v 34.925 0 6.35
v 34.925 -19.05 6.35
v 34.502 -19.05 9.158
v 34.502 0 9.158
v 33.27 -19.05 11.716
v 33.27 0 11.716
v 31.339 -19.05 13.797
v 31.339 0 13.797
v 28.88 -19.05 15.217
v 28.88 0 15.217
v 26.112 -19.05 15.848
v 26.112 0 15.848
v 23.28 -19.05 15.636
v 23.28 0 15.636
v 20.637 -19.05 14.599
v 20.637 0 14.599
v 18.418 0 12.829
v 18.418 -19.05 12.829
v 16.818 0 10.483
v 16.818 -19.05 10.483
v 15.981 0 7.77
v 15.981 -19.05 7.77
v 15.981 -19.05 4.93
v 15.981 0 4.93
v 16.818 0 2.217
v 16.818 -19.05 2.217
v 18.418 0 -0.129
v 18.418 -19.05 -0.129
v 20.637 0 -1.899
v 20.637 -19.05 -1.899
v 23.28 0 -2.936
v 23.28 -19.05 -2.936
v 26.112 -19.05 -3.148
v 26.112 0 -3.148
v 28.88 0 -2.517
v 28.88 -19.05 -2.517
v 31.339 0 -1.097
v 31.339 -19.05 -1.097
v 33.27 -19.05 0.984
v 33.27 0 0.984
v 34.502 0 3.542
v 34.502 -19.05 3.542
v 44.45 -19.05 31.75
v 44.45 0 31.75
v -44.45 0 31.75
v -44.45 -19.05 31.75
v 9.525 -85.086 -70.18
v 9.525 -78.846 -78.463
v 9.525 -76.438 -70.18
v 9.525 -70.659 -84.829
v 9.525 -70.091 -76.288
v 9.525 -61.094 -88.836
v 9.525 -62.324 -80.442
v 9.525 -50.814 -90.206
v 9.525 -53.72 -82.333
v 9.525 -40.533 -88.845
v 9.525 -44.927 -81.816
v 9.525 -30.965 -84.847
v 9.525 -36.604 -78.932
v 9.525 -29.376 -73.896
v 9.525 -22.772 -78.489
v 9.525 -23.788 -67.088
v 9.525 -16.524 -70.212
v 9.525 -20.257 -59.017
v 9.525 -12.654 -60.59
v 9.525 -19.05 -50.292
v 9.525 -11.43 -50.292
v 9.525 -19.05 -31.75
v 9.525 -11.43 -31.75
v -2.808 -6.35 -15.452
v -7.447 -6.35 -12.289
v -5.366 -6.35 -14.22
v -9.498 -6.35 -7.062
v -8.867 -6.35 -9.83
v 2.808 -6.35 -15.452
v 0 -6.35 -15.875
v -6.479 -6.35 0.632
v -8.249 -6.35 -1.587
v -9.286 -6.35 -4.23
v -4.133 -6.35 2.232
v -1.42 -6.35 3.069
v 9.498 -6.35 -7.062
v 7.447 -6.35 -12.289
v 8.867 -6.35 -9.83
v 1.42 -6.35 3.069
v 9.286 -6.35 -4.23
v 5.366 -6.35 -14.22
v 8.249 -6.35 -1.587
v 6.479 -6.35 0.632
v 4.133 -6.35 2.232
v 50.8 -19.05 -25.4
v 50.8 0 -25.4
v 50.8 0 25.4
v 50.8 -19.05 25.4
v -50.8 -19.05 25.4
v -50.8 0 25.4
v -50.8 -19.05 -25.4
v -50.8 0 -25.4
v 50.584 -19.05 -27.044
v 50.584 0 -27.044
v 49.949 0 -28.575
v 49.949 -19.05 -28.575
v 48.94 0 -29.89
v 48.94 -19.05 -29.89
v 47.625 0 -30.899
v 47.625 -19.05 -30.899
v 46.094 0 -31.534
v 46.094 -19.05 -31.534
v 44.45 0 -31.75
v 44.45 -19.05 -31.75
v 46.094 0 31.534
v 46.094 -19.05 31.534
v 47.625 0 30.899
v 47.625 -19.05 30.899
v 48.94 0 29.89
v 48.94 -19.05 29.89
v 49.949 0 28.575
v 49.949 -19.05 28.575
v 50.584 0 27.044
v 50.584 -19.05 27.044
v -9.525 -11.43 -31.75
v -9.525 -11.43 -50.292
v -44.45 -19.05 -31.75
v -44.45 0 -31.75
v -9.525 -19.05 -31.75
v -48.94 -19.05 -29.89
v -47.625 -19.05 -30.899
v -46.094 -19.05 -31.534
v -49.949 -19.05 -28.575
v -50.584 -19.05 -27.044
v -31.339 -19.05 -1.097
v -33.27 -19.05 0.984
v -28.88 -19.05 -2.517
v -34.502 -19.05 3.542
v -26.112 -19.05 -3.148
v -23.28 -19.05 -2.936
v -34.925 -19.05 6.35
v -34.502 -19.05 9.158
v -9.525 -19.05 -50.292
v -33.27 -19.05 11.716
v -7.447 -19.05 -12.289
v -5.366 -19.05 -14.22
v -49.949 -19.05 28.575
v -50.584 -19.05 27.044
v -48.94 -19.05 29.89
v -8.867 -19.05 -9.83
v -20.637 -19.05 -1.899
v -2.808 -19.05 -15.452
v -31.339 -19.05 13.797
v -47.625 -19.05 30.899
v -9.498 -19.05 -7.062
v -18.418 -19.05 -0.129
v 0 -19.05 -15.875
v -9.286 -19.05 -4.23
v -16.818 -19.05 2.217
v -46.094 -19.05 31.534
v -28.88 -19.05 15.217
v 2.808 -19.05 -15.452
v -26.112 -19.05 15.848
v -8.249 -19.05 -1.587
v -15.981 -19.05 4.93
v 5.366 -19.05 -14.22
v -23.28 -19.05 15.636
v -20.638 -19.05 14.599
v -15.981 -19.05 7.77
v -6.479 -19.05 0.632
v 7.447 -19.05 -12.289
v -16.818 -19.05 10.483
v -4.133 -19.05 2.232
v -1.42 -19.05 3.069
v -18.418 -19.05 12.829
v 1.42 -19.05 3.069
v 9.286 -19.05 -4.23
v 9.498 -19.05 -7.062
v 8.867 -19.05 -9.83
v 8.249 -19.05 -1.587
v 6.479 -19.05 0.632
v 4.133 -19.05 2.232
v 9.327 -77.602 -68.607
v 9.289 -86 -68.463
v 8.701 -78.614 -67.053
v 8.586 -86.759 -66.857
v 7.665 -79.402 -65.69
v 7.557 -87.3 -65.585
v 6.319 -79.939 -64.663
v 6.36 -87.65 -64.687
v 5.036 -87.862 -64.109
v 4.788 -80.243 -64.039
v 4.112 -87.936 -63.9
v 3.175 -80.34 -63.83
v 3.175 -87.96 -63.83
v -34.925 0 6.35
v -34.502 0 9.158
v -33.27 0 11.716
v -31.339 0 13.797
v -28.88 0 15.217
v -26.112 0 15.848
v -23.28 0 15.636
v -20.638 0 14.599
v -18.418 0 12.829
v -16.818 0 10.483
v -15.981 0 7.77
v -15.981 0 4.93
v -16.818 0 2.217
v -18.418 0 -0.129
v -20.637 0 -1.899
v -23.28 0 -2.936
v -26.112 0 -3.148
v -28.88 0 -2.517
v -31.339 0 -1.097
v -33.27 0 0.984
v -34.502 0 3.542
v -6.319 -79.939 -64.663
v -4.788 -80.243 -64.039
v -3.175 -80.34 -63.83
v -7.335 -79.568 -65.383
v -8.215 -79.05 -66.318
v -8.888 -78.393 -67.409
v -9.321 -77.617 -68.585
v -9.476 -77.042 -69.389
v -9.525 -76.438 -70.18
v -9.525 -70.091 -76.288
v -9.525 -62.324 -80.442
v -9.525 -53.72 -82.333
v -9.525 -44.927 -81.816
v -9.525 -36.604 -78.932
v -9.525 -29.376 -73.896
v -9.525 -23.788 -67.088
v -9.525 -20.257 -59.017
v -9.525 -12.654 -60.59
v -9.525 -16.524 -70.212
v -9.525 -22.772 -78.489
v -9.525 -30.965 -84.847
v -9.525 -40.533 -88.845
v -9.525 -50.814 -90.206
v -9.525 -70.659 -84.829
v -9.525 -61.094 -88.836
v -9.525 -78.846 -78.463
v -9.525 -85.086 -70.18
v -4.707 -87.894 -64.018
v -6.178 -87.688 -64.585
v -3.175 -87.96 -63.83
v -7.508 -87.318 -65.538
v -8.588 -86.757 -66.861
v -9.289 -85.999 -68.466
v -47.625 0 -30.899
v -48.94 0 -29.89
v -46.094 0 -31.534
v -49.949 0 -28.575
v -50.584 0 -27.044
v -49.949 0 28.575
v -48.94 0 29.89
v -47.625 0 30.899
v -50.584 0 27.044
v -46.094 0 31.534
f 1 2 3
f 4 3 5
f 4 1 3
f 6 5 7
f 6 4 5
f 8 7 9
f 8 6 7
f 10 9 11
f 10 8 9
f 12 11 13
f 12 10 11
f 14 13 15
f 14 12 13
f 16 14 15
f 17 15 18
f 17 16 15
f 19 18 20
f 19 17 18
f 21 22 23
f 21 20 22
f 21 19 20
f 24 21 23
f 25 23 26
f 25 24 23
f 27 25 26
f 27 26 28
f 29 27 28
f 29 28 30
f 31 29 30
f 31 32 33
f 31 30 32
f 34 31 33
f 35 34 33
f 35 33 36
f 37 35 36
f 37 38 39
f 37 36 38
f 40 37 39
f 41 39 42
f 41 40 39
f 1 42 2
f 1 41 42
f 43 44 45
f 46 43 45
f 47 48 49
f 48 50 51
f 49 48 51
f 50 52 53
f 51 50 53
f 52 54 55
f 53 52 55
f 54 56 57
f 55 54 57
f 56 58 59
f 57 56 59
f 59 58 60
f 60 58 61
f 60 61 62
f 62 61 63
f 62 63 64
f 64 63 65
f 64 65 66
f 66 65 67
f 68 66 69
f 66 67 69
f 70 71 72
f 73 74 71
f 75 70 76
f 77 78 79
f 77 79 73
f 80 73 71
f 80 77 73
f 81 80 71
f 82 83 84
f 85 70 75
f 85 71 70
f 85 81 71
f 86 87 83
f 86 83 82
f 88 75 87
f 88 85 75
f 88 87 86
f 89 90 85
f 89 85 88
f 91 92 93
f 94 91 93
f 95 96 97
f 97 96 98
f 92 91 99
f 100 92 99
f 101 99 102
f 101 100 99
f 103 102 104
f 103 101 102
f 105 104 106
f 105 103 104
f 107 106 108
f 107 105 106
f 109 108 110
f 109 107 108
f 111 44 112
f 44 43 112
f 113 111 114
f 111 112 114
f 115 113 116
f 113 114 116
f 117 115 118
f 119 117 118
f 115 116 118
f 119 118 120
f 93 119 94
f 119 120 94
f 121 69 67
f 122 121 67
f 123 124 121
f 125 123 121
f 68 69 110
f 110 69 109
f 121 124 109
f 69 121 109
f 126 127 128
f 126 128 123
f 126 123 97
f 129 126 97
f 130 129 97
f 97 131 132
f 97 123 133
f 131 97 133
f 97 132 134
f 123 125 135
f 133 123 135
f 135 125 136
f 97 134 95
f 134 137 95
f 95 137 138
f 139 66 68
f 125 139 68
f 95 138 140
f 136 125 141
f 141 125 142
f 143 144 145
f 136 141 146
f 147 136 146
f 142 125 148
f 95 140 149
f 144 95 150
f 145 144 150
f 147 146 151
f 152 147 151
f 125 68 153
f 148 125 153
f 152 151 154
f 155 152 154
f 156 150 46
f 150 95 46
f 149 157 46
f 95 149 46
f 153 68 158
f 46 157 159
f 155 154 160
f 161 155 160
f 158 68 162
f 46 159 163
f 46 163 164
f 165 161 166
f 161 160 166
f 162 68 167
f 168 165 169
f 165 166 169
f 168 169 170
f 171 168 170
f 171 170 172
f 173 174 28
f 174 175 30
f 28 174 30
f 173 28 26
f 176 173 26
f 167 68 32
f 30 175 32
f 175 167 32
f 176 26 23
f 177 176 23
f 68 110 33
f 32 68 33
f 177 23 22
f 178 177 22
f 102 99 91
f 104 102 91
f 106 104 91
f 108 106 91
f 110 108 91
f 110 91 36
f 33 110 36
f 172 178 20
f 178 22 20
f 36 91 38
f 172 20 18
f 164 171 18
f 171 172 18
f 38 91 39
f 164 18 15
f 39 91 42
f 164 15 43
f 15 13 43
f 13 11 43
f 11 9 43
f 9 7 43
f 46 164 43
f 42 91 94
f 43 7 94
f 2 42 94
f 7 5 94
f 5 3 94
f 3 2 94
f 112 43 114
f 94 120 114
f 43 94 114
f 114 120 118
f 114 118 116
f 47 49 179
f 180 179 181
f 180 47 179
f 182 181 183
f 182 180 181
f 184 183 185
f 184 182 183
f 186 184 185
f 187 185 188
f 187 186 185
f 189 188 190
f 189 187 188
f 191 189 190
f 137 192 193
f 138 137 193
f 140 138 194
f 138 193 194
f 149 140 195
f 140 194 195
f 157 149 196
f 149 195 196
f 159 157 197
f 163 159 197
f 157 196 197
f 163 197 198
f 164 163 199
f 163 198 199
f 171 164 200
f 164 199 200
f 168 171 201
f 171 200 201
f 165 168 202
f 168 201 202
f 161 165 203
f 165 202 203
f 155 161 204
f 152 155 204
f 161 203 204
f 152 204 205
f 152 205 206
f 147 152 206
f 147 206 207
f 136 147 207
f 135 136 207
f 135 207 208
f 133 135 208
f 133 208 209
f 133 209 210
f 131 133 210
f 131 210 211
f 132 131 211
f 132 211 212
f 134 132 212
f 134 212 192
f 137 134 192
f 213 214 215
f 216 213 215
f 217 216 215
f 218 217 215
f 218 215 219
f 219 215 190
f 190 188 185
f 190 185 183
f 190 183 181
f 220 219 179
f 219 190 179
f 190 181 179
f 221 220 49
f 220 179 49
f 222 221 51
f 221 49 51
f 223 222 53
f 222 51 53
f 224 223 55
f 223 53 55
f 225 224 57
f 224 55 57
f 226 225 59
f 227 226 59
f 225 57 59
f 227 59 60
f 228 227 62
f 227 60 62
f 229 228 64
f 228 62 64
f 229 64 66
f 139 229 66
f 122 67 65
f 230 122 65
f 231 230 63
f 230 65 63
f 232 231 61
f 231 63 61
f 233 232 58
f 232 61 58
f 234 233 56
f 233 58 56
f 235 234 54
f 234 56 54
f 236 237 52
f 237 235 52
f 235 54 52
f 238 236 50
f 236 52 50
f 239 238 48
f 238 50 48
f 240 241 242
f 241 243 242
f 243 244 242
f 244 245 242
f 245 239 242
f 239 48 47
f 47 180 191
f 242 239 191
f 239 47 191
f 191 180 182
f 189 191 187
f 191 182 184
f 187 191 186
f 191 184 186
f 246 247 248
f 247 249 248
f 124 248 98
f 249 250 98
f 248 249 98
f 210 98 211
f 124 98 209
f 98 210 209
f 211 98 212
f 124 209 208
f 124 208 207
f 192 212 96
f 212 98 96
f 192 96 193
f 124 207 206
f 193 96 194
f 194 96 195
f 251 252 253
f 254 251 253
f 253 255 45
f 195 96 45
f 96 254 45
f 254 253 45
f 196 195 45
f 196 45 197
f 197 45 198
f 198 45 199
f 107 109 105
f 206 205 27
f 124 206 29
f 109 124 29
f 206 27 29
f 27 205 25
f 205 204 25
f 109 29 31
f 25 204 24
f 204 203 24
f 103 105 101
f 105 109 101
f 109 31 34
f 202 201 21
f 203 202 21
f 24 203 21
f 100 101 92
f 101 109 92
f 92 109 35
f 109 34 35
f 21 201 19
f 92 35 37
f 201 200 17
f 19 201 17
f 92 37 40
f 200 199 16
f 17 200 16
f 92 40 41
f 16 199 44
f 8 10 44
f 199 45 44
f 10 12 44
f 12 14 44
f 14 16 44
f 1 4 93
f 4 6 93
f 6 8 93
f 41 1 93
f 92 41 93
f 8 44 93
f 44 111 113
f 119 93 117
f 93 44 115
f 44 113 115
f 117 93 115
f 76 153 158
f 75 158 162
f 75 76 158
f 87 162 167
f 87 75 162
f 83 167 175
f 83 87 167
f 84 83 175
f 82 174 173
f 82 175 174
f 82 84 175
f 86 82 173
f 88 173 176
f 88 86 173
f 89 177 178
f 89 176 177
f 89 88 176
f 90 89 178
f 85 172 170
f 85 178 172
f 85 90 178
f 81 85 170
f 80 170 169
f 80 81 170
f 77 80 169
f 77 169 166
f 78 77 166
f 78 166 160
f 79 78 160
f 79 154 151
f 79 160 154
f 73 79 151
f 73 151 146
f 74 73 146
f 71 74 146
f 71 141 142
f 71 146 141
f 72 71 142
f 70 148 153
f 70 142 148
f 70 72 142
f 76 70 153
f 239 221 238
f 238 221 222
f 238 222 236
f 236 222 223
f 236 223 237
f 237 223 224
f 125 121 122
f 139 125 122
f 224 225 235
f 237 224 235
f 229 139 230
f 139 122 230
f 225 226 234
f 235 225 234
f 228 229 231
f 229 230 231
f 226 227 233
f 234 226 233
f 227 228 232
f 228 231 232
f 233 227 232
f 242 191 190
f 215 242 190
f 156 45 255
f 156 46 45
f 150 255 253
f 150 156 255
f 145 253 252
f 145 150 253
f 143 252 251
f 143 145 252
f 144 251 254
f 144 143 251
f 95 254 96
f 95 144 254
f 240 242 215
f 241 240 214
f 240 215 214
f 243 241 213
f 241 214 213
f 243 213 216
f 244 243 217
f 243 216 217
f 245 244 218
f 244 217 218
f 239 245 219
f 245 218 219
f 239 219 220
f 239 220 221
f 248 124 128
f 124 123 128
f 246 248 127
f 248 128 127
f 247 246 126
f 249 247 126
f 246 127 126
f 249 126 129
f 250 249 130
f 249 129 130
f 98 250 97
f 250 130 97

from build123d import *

# Parameters (mm, degrees)
F0_R     = 9.525
F1_DEPTH = 87.9602
F2_W     = 159.8871313035
F2_H     = 188.4720697999
F2_W_2   = 68.9102
F2_H_2   = 63.5
F3_DEPTH = 101.601
F4_R     = 6.35
F5_DEPTH = 87.9612001
F6_DEPTH = 6.35


with BuildPart() as f1:
    # F0 (on Front) → F1 (new body)
    with BuildSketch(Plane.XZ):
        Polygon((50.8, 31.75), (-50.8, 31.75), (-50.8, 6.35), (-50.8, -31.75), (-9.525, -31.75), (0, -31.75), (9.525, -31.75), (50.8, -31.75), (50.8, 6.35), align=None)
        with BuildLine():
            ThreePointArc((9.525, -6.35), (6.7351920908, -13.0851920908), (0, -15.875))
            ThreePointArc((0, -15.875), (-6.7351920908, 0.3851920908), (9.525, -6.35))
        make_face(mode=Mode.SUBTRACT)
        with BuildLine():
            ThreePointArc((-15.875, 6.35), (-25.4, -3.175), (-34.925, 6.35))
            ThreePointArc((-34.925, 6.35), (-25.4, 15.875), (-15.875, 6.35))
        make_face(mode=Mode.SUBTRACT)
        with Locations((25.4, 6.35)):
            Circle(F0_R, mode=Mode.SUBTRACT)
        Polygon((0, -31.75), (-9.525, -31.75), (-9.525, -120.0502738357), (9.525, -119.6629032493), (9.525, -31.75), align=None)
        with BuildLine():
            ThreePointArc((9.525, -6.35), (-6.7351920908, 0.3851920908), (0, -15.875))
            ThreePointArc((0, -15.875), (6.7351920908, -13.0851920908), (9.525, -6.35))
        make_face()
    extrude(amount=F1_DEPTH)

    # F2 (on face) → F3 (cut, through all)
    with BuildSketch(Plane.YZ.offset(50.8)):
        with Locations((-38.3915323764, -28.8357771933)):
            Rectangle(F2_W, F2_H)
        with BuildLine():
            Line((-19.05, 31.75), (0, 31.75))
            Line((0, 31.75), (0, -31.75))
            Line((0, -31.75), (-11.43, -31.75))
            Line((-11.43, -31.75), (-11.43, -50.292))
            ThreePointArc((-11.43, -50.292), (-43.9381582579, -89.604562418), (-87.9602, -63.8302))
            Line((-87.9602, -63.8302), (-87.9602, -31.75))
            Line((-87.9602, -31.75), (-87.9602, 31.75))
            Line((-87.9602, 31.75), (-19.05, 31.75))
        make_face(mode=Mode.SUBTRACT)
        with Locations((-53.5051, 0)):
            Rectangle(F2_W_2, F2_H_2)
        with BuildLine():
            Line((-19.05, -50.292), (-19.05, -31.75))
            Line((-19.05, -31.75), (-87.9602, -31.75))
            Line((-87.9602, -31.75), (-87.9602, -63.8302))
            Line((-87.9602, -63.8302), (-80.3402, -63.8302))
            ThreePointArc((-80.3402, -63.8302), (-44.2580362559, -81.6757994644), (-19.05, -50.292))
        make_face()
    extrude(amount=-F3_DEPTH, mode=Mode.SUBTRACT)

    # F4
    f4_edges = [f1.edges().sort_by_distance(p)[0] for p in [
        (-50.8, -9.525, 31.75),
        (50.8, -9.525, 31.75),
        (50.8, -9.525, -31.75),
        (-50.8, -9.525, -31.75),
        (-9.525, -84.1502, -63.8302),
        (9.525, -84.1502, -63.8302),
    ]]
    fillet(f4_edges, radius=F4_R)

    # F0 (on Front) → F5 (cut, through all)
    with BuildSketch(Plane.XZ):
        with BuildLine():
            ThreePointArc((9.525, -6.35), (-6.7351920908, 0.3851920908), (0, -15.875))
            ThreePointArc((0, -15.875), (6.7351920908, -13.0851920908), (9.525, -6.35))
        make_face()
    extrude(amount=F5_DEPTH, mode=Mode.SUBTRACT)

    # F0 (on Front) → F6 (join)
    with BuildSketch(Plane.XZ):
        with BuildLine():
            ThreePointArc((9.525, -6.35), (-6.7351920908, 0.3851920908), (0, -15.875))
            ThreePointArc((0, -15.875), (6.7351920908, -13.0851920908), (9.525, -6.35))
        make_face()
    extrude(amount=F6_DEPTH)


solid = f1.part
